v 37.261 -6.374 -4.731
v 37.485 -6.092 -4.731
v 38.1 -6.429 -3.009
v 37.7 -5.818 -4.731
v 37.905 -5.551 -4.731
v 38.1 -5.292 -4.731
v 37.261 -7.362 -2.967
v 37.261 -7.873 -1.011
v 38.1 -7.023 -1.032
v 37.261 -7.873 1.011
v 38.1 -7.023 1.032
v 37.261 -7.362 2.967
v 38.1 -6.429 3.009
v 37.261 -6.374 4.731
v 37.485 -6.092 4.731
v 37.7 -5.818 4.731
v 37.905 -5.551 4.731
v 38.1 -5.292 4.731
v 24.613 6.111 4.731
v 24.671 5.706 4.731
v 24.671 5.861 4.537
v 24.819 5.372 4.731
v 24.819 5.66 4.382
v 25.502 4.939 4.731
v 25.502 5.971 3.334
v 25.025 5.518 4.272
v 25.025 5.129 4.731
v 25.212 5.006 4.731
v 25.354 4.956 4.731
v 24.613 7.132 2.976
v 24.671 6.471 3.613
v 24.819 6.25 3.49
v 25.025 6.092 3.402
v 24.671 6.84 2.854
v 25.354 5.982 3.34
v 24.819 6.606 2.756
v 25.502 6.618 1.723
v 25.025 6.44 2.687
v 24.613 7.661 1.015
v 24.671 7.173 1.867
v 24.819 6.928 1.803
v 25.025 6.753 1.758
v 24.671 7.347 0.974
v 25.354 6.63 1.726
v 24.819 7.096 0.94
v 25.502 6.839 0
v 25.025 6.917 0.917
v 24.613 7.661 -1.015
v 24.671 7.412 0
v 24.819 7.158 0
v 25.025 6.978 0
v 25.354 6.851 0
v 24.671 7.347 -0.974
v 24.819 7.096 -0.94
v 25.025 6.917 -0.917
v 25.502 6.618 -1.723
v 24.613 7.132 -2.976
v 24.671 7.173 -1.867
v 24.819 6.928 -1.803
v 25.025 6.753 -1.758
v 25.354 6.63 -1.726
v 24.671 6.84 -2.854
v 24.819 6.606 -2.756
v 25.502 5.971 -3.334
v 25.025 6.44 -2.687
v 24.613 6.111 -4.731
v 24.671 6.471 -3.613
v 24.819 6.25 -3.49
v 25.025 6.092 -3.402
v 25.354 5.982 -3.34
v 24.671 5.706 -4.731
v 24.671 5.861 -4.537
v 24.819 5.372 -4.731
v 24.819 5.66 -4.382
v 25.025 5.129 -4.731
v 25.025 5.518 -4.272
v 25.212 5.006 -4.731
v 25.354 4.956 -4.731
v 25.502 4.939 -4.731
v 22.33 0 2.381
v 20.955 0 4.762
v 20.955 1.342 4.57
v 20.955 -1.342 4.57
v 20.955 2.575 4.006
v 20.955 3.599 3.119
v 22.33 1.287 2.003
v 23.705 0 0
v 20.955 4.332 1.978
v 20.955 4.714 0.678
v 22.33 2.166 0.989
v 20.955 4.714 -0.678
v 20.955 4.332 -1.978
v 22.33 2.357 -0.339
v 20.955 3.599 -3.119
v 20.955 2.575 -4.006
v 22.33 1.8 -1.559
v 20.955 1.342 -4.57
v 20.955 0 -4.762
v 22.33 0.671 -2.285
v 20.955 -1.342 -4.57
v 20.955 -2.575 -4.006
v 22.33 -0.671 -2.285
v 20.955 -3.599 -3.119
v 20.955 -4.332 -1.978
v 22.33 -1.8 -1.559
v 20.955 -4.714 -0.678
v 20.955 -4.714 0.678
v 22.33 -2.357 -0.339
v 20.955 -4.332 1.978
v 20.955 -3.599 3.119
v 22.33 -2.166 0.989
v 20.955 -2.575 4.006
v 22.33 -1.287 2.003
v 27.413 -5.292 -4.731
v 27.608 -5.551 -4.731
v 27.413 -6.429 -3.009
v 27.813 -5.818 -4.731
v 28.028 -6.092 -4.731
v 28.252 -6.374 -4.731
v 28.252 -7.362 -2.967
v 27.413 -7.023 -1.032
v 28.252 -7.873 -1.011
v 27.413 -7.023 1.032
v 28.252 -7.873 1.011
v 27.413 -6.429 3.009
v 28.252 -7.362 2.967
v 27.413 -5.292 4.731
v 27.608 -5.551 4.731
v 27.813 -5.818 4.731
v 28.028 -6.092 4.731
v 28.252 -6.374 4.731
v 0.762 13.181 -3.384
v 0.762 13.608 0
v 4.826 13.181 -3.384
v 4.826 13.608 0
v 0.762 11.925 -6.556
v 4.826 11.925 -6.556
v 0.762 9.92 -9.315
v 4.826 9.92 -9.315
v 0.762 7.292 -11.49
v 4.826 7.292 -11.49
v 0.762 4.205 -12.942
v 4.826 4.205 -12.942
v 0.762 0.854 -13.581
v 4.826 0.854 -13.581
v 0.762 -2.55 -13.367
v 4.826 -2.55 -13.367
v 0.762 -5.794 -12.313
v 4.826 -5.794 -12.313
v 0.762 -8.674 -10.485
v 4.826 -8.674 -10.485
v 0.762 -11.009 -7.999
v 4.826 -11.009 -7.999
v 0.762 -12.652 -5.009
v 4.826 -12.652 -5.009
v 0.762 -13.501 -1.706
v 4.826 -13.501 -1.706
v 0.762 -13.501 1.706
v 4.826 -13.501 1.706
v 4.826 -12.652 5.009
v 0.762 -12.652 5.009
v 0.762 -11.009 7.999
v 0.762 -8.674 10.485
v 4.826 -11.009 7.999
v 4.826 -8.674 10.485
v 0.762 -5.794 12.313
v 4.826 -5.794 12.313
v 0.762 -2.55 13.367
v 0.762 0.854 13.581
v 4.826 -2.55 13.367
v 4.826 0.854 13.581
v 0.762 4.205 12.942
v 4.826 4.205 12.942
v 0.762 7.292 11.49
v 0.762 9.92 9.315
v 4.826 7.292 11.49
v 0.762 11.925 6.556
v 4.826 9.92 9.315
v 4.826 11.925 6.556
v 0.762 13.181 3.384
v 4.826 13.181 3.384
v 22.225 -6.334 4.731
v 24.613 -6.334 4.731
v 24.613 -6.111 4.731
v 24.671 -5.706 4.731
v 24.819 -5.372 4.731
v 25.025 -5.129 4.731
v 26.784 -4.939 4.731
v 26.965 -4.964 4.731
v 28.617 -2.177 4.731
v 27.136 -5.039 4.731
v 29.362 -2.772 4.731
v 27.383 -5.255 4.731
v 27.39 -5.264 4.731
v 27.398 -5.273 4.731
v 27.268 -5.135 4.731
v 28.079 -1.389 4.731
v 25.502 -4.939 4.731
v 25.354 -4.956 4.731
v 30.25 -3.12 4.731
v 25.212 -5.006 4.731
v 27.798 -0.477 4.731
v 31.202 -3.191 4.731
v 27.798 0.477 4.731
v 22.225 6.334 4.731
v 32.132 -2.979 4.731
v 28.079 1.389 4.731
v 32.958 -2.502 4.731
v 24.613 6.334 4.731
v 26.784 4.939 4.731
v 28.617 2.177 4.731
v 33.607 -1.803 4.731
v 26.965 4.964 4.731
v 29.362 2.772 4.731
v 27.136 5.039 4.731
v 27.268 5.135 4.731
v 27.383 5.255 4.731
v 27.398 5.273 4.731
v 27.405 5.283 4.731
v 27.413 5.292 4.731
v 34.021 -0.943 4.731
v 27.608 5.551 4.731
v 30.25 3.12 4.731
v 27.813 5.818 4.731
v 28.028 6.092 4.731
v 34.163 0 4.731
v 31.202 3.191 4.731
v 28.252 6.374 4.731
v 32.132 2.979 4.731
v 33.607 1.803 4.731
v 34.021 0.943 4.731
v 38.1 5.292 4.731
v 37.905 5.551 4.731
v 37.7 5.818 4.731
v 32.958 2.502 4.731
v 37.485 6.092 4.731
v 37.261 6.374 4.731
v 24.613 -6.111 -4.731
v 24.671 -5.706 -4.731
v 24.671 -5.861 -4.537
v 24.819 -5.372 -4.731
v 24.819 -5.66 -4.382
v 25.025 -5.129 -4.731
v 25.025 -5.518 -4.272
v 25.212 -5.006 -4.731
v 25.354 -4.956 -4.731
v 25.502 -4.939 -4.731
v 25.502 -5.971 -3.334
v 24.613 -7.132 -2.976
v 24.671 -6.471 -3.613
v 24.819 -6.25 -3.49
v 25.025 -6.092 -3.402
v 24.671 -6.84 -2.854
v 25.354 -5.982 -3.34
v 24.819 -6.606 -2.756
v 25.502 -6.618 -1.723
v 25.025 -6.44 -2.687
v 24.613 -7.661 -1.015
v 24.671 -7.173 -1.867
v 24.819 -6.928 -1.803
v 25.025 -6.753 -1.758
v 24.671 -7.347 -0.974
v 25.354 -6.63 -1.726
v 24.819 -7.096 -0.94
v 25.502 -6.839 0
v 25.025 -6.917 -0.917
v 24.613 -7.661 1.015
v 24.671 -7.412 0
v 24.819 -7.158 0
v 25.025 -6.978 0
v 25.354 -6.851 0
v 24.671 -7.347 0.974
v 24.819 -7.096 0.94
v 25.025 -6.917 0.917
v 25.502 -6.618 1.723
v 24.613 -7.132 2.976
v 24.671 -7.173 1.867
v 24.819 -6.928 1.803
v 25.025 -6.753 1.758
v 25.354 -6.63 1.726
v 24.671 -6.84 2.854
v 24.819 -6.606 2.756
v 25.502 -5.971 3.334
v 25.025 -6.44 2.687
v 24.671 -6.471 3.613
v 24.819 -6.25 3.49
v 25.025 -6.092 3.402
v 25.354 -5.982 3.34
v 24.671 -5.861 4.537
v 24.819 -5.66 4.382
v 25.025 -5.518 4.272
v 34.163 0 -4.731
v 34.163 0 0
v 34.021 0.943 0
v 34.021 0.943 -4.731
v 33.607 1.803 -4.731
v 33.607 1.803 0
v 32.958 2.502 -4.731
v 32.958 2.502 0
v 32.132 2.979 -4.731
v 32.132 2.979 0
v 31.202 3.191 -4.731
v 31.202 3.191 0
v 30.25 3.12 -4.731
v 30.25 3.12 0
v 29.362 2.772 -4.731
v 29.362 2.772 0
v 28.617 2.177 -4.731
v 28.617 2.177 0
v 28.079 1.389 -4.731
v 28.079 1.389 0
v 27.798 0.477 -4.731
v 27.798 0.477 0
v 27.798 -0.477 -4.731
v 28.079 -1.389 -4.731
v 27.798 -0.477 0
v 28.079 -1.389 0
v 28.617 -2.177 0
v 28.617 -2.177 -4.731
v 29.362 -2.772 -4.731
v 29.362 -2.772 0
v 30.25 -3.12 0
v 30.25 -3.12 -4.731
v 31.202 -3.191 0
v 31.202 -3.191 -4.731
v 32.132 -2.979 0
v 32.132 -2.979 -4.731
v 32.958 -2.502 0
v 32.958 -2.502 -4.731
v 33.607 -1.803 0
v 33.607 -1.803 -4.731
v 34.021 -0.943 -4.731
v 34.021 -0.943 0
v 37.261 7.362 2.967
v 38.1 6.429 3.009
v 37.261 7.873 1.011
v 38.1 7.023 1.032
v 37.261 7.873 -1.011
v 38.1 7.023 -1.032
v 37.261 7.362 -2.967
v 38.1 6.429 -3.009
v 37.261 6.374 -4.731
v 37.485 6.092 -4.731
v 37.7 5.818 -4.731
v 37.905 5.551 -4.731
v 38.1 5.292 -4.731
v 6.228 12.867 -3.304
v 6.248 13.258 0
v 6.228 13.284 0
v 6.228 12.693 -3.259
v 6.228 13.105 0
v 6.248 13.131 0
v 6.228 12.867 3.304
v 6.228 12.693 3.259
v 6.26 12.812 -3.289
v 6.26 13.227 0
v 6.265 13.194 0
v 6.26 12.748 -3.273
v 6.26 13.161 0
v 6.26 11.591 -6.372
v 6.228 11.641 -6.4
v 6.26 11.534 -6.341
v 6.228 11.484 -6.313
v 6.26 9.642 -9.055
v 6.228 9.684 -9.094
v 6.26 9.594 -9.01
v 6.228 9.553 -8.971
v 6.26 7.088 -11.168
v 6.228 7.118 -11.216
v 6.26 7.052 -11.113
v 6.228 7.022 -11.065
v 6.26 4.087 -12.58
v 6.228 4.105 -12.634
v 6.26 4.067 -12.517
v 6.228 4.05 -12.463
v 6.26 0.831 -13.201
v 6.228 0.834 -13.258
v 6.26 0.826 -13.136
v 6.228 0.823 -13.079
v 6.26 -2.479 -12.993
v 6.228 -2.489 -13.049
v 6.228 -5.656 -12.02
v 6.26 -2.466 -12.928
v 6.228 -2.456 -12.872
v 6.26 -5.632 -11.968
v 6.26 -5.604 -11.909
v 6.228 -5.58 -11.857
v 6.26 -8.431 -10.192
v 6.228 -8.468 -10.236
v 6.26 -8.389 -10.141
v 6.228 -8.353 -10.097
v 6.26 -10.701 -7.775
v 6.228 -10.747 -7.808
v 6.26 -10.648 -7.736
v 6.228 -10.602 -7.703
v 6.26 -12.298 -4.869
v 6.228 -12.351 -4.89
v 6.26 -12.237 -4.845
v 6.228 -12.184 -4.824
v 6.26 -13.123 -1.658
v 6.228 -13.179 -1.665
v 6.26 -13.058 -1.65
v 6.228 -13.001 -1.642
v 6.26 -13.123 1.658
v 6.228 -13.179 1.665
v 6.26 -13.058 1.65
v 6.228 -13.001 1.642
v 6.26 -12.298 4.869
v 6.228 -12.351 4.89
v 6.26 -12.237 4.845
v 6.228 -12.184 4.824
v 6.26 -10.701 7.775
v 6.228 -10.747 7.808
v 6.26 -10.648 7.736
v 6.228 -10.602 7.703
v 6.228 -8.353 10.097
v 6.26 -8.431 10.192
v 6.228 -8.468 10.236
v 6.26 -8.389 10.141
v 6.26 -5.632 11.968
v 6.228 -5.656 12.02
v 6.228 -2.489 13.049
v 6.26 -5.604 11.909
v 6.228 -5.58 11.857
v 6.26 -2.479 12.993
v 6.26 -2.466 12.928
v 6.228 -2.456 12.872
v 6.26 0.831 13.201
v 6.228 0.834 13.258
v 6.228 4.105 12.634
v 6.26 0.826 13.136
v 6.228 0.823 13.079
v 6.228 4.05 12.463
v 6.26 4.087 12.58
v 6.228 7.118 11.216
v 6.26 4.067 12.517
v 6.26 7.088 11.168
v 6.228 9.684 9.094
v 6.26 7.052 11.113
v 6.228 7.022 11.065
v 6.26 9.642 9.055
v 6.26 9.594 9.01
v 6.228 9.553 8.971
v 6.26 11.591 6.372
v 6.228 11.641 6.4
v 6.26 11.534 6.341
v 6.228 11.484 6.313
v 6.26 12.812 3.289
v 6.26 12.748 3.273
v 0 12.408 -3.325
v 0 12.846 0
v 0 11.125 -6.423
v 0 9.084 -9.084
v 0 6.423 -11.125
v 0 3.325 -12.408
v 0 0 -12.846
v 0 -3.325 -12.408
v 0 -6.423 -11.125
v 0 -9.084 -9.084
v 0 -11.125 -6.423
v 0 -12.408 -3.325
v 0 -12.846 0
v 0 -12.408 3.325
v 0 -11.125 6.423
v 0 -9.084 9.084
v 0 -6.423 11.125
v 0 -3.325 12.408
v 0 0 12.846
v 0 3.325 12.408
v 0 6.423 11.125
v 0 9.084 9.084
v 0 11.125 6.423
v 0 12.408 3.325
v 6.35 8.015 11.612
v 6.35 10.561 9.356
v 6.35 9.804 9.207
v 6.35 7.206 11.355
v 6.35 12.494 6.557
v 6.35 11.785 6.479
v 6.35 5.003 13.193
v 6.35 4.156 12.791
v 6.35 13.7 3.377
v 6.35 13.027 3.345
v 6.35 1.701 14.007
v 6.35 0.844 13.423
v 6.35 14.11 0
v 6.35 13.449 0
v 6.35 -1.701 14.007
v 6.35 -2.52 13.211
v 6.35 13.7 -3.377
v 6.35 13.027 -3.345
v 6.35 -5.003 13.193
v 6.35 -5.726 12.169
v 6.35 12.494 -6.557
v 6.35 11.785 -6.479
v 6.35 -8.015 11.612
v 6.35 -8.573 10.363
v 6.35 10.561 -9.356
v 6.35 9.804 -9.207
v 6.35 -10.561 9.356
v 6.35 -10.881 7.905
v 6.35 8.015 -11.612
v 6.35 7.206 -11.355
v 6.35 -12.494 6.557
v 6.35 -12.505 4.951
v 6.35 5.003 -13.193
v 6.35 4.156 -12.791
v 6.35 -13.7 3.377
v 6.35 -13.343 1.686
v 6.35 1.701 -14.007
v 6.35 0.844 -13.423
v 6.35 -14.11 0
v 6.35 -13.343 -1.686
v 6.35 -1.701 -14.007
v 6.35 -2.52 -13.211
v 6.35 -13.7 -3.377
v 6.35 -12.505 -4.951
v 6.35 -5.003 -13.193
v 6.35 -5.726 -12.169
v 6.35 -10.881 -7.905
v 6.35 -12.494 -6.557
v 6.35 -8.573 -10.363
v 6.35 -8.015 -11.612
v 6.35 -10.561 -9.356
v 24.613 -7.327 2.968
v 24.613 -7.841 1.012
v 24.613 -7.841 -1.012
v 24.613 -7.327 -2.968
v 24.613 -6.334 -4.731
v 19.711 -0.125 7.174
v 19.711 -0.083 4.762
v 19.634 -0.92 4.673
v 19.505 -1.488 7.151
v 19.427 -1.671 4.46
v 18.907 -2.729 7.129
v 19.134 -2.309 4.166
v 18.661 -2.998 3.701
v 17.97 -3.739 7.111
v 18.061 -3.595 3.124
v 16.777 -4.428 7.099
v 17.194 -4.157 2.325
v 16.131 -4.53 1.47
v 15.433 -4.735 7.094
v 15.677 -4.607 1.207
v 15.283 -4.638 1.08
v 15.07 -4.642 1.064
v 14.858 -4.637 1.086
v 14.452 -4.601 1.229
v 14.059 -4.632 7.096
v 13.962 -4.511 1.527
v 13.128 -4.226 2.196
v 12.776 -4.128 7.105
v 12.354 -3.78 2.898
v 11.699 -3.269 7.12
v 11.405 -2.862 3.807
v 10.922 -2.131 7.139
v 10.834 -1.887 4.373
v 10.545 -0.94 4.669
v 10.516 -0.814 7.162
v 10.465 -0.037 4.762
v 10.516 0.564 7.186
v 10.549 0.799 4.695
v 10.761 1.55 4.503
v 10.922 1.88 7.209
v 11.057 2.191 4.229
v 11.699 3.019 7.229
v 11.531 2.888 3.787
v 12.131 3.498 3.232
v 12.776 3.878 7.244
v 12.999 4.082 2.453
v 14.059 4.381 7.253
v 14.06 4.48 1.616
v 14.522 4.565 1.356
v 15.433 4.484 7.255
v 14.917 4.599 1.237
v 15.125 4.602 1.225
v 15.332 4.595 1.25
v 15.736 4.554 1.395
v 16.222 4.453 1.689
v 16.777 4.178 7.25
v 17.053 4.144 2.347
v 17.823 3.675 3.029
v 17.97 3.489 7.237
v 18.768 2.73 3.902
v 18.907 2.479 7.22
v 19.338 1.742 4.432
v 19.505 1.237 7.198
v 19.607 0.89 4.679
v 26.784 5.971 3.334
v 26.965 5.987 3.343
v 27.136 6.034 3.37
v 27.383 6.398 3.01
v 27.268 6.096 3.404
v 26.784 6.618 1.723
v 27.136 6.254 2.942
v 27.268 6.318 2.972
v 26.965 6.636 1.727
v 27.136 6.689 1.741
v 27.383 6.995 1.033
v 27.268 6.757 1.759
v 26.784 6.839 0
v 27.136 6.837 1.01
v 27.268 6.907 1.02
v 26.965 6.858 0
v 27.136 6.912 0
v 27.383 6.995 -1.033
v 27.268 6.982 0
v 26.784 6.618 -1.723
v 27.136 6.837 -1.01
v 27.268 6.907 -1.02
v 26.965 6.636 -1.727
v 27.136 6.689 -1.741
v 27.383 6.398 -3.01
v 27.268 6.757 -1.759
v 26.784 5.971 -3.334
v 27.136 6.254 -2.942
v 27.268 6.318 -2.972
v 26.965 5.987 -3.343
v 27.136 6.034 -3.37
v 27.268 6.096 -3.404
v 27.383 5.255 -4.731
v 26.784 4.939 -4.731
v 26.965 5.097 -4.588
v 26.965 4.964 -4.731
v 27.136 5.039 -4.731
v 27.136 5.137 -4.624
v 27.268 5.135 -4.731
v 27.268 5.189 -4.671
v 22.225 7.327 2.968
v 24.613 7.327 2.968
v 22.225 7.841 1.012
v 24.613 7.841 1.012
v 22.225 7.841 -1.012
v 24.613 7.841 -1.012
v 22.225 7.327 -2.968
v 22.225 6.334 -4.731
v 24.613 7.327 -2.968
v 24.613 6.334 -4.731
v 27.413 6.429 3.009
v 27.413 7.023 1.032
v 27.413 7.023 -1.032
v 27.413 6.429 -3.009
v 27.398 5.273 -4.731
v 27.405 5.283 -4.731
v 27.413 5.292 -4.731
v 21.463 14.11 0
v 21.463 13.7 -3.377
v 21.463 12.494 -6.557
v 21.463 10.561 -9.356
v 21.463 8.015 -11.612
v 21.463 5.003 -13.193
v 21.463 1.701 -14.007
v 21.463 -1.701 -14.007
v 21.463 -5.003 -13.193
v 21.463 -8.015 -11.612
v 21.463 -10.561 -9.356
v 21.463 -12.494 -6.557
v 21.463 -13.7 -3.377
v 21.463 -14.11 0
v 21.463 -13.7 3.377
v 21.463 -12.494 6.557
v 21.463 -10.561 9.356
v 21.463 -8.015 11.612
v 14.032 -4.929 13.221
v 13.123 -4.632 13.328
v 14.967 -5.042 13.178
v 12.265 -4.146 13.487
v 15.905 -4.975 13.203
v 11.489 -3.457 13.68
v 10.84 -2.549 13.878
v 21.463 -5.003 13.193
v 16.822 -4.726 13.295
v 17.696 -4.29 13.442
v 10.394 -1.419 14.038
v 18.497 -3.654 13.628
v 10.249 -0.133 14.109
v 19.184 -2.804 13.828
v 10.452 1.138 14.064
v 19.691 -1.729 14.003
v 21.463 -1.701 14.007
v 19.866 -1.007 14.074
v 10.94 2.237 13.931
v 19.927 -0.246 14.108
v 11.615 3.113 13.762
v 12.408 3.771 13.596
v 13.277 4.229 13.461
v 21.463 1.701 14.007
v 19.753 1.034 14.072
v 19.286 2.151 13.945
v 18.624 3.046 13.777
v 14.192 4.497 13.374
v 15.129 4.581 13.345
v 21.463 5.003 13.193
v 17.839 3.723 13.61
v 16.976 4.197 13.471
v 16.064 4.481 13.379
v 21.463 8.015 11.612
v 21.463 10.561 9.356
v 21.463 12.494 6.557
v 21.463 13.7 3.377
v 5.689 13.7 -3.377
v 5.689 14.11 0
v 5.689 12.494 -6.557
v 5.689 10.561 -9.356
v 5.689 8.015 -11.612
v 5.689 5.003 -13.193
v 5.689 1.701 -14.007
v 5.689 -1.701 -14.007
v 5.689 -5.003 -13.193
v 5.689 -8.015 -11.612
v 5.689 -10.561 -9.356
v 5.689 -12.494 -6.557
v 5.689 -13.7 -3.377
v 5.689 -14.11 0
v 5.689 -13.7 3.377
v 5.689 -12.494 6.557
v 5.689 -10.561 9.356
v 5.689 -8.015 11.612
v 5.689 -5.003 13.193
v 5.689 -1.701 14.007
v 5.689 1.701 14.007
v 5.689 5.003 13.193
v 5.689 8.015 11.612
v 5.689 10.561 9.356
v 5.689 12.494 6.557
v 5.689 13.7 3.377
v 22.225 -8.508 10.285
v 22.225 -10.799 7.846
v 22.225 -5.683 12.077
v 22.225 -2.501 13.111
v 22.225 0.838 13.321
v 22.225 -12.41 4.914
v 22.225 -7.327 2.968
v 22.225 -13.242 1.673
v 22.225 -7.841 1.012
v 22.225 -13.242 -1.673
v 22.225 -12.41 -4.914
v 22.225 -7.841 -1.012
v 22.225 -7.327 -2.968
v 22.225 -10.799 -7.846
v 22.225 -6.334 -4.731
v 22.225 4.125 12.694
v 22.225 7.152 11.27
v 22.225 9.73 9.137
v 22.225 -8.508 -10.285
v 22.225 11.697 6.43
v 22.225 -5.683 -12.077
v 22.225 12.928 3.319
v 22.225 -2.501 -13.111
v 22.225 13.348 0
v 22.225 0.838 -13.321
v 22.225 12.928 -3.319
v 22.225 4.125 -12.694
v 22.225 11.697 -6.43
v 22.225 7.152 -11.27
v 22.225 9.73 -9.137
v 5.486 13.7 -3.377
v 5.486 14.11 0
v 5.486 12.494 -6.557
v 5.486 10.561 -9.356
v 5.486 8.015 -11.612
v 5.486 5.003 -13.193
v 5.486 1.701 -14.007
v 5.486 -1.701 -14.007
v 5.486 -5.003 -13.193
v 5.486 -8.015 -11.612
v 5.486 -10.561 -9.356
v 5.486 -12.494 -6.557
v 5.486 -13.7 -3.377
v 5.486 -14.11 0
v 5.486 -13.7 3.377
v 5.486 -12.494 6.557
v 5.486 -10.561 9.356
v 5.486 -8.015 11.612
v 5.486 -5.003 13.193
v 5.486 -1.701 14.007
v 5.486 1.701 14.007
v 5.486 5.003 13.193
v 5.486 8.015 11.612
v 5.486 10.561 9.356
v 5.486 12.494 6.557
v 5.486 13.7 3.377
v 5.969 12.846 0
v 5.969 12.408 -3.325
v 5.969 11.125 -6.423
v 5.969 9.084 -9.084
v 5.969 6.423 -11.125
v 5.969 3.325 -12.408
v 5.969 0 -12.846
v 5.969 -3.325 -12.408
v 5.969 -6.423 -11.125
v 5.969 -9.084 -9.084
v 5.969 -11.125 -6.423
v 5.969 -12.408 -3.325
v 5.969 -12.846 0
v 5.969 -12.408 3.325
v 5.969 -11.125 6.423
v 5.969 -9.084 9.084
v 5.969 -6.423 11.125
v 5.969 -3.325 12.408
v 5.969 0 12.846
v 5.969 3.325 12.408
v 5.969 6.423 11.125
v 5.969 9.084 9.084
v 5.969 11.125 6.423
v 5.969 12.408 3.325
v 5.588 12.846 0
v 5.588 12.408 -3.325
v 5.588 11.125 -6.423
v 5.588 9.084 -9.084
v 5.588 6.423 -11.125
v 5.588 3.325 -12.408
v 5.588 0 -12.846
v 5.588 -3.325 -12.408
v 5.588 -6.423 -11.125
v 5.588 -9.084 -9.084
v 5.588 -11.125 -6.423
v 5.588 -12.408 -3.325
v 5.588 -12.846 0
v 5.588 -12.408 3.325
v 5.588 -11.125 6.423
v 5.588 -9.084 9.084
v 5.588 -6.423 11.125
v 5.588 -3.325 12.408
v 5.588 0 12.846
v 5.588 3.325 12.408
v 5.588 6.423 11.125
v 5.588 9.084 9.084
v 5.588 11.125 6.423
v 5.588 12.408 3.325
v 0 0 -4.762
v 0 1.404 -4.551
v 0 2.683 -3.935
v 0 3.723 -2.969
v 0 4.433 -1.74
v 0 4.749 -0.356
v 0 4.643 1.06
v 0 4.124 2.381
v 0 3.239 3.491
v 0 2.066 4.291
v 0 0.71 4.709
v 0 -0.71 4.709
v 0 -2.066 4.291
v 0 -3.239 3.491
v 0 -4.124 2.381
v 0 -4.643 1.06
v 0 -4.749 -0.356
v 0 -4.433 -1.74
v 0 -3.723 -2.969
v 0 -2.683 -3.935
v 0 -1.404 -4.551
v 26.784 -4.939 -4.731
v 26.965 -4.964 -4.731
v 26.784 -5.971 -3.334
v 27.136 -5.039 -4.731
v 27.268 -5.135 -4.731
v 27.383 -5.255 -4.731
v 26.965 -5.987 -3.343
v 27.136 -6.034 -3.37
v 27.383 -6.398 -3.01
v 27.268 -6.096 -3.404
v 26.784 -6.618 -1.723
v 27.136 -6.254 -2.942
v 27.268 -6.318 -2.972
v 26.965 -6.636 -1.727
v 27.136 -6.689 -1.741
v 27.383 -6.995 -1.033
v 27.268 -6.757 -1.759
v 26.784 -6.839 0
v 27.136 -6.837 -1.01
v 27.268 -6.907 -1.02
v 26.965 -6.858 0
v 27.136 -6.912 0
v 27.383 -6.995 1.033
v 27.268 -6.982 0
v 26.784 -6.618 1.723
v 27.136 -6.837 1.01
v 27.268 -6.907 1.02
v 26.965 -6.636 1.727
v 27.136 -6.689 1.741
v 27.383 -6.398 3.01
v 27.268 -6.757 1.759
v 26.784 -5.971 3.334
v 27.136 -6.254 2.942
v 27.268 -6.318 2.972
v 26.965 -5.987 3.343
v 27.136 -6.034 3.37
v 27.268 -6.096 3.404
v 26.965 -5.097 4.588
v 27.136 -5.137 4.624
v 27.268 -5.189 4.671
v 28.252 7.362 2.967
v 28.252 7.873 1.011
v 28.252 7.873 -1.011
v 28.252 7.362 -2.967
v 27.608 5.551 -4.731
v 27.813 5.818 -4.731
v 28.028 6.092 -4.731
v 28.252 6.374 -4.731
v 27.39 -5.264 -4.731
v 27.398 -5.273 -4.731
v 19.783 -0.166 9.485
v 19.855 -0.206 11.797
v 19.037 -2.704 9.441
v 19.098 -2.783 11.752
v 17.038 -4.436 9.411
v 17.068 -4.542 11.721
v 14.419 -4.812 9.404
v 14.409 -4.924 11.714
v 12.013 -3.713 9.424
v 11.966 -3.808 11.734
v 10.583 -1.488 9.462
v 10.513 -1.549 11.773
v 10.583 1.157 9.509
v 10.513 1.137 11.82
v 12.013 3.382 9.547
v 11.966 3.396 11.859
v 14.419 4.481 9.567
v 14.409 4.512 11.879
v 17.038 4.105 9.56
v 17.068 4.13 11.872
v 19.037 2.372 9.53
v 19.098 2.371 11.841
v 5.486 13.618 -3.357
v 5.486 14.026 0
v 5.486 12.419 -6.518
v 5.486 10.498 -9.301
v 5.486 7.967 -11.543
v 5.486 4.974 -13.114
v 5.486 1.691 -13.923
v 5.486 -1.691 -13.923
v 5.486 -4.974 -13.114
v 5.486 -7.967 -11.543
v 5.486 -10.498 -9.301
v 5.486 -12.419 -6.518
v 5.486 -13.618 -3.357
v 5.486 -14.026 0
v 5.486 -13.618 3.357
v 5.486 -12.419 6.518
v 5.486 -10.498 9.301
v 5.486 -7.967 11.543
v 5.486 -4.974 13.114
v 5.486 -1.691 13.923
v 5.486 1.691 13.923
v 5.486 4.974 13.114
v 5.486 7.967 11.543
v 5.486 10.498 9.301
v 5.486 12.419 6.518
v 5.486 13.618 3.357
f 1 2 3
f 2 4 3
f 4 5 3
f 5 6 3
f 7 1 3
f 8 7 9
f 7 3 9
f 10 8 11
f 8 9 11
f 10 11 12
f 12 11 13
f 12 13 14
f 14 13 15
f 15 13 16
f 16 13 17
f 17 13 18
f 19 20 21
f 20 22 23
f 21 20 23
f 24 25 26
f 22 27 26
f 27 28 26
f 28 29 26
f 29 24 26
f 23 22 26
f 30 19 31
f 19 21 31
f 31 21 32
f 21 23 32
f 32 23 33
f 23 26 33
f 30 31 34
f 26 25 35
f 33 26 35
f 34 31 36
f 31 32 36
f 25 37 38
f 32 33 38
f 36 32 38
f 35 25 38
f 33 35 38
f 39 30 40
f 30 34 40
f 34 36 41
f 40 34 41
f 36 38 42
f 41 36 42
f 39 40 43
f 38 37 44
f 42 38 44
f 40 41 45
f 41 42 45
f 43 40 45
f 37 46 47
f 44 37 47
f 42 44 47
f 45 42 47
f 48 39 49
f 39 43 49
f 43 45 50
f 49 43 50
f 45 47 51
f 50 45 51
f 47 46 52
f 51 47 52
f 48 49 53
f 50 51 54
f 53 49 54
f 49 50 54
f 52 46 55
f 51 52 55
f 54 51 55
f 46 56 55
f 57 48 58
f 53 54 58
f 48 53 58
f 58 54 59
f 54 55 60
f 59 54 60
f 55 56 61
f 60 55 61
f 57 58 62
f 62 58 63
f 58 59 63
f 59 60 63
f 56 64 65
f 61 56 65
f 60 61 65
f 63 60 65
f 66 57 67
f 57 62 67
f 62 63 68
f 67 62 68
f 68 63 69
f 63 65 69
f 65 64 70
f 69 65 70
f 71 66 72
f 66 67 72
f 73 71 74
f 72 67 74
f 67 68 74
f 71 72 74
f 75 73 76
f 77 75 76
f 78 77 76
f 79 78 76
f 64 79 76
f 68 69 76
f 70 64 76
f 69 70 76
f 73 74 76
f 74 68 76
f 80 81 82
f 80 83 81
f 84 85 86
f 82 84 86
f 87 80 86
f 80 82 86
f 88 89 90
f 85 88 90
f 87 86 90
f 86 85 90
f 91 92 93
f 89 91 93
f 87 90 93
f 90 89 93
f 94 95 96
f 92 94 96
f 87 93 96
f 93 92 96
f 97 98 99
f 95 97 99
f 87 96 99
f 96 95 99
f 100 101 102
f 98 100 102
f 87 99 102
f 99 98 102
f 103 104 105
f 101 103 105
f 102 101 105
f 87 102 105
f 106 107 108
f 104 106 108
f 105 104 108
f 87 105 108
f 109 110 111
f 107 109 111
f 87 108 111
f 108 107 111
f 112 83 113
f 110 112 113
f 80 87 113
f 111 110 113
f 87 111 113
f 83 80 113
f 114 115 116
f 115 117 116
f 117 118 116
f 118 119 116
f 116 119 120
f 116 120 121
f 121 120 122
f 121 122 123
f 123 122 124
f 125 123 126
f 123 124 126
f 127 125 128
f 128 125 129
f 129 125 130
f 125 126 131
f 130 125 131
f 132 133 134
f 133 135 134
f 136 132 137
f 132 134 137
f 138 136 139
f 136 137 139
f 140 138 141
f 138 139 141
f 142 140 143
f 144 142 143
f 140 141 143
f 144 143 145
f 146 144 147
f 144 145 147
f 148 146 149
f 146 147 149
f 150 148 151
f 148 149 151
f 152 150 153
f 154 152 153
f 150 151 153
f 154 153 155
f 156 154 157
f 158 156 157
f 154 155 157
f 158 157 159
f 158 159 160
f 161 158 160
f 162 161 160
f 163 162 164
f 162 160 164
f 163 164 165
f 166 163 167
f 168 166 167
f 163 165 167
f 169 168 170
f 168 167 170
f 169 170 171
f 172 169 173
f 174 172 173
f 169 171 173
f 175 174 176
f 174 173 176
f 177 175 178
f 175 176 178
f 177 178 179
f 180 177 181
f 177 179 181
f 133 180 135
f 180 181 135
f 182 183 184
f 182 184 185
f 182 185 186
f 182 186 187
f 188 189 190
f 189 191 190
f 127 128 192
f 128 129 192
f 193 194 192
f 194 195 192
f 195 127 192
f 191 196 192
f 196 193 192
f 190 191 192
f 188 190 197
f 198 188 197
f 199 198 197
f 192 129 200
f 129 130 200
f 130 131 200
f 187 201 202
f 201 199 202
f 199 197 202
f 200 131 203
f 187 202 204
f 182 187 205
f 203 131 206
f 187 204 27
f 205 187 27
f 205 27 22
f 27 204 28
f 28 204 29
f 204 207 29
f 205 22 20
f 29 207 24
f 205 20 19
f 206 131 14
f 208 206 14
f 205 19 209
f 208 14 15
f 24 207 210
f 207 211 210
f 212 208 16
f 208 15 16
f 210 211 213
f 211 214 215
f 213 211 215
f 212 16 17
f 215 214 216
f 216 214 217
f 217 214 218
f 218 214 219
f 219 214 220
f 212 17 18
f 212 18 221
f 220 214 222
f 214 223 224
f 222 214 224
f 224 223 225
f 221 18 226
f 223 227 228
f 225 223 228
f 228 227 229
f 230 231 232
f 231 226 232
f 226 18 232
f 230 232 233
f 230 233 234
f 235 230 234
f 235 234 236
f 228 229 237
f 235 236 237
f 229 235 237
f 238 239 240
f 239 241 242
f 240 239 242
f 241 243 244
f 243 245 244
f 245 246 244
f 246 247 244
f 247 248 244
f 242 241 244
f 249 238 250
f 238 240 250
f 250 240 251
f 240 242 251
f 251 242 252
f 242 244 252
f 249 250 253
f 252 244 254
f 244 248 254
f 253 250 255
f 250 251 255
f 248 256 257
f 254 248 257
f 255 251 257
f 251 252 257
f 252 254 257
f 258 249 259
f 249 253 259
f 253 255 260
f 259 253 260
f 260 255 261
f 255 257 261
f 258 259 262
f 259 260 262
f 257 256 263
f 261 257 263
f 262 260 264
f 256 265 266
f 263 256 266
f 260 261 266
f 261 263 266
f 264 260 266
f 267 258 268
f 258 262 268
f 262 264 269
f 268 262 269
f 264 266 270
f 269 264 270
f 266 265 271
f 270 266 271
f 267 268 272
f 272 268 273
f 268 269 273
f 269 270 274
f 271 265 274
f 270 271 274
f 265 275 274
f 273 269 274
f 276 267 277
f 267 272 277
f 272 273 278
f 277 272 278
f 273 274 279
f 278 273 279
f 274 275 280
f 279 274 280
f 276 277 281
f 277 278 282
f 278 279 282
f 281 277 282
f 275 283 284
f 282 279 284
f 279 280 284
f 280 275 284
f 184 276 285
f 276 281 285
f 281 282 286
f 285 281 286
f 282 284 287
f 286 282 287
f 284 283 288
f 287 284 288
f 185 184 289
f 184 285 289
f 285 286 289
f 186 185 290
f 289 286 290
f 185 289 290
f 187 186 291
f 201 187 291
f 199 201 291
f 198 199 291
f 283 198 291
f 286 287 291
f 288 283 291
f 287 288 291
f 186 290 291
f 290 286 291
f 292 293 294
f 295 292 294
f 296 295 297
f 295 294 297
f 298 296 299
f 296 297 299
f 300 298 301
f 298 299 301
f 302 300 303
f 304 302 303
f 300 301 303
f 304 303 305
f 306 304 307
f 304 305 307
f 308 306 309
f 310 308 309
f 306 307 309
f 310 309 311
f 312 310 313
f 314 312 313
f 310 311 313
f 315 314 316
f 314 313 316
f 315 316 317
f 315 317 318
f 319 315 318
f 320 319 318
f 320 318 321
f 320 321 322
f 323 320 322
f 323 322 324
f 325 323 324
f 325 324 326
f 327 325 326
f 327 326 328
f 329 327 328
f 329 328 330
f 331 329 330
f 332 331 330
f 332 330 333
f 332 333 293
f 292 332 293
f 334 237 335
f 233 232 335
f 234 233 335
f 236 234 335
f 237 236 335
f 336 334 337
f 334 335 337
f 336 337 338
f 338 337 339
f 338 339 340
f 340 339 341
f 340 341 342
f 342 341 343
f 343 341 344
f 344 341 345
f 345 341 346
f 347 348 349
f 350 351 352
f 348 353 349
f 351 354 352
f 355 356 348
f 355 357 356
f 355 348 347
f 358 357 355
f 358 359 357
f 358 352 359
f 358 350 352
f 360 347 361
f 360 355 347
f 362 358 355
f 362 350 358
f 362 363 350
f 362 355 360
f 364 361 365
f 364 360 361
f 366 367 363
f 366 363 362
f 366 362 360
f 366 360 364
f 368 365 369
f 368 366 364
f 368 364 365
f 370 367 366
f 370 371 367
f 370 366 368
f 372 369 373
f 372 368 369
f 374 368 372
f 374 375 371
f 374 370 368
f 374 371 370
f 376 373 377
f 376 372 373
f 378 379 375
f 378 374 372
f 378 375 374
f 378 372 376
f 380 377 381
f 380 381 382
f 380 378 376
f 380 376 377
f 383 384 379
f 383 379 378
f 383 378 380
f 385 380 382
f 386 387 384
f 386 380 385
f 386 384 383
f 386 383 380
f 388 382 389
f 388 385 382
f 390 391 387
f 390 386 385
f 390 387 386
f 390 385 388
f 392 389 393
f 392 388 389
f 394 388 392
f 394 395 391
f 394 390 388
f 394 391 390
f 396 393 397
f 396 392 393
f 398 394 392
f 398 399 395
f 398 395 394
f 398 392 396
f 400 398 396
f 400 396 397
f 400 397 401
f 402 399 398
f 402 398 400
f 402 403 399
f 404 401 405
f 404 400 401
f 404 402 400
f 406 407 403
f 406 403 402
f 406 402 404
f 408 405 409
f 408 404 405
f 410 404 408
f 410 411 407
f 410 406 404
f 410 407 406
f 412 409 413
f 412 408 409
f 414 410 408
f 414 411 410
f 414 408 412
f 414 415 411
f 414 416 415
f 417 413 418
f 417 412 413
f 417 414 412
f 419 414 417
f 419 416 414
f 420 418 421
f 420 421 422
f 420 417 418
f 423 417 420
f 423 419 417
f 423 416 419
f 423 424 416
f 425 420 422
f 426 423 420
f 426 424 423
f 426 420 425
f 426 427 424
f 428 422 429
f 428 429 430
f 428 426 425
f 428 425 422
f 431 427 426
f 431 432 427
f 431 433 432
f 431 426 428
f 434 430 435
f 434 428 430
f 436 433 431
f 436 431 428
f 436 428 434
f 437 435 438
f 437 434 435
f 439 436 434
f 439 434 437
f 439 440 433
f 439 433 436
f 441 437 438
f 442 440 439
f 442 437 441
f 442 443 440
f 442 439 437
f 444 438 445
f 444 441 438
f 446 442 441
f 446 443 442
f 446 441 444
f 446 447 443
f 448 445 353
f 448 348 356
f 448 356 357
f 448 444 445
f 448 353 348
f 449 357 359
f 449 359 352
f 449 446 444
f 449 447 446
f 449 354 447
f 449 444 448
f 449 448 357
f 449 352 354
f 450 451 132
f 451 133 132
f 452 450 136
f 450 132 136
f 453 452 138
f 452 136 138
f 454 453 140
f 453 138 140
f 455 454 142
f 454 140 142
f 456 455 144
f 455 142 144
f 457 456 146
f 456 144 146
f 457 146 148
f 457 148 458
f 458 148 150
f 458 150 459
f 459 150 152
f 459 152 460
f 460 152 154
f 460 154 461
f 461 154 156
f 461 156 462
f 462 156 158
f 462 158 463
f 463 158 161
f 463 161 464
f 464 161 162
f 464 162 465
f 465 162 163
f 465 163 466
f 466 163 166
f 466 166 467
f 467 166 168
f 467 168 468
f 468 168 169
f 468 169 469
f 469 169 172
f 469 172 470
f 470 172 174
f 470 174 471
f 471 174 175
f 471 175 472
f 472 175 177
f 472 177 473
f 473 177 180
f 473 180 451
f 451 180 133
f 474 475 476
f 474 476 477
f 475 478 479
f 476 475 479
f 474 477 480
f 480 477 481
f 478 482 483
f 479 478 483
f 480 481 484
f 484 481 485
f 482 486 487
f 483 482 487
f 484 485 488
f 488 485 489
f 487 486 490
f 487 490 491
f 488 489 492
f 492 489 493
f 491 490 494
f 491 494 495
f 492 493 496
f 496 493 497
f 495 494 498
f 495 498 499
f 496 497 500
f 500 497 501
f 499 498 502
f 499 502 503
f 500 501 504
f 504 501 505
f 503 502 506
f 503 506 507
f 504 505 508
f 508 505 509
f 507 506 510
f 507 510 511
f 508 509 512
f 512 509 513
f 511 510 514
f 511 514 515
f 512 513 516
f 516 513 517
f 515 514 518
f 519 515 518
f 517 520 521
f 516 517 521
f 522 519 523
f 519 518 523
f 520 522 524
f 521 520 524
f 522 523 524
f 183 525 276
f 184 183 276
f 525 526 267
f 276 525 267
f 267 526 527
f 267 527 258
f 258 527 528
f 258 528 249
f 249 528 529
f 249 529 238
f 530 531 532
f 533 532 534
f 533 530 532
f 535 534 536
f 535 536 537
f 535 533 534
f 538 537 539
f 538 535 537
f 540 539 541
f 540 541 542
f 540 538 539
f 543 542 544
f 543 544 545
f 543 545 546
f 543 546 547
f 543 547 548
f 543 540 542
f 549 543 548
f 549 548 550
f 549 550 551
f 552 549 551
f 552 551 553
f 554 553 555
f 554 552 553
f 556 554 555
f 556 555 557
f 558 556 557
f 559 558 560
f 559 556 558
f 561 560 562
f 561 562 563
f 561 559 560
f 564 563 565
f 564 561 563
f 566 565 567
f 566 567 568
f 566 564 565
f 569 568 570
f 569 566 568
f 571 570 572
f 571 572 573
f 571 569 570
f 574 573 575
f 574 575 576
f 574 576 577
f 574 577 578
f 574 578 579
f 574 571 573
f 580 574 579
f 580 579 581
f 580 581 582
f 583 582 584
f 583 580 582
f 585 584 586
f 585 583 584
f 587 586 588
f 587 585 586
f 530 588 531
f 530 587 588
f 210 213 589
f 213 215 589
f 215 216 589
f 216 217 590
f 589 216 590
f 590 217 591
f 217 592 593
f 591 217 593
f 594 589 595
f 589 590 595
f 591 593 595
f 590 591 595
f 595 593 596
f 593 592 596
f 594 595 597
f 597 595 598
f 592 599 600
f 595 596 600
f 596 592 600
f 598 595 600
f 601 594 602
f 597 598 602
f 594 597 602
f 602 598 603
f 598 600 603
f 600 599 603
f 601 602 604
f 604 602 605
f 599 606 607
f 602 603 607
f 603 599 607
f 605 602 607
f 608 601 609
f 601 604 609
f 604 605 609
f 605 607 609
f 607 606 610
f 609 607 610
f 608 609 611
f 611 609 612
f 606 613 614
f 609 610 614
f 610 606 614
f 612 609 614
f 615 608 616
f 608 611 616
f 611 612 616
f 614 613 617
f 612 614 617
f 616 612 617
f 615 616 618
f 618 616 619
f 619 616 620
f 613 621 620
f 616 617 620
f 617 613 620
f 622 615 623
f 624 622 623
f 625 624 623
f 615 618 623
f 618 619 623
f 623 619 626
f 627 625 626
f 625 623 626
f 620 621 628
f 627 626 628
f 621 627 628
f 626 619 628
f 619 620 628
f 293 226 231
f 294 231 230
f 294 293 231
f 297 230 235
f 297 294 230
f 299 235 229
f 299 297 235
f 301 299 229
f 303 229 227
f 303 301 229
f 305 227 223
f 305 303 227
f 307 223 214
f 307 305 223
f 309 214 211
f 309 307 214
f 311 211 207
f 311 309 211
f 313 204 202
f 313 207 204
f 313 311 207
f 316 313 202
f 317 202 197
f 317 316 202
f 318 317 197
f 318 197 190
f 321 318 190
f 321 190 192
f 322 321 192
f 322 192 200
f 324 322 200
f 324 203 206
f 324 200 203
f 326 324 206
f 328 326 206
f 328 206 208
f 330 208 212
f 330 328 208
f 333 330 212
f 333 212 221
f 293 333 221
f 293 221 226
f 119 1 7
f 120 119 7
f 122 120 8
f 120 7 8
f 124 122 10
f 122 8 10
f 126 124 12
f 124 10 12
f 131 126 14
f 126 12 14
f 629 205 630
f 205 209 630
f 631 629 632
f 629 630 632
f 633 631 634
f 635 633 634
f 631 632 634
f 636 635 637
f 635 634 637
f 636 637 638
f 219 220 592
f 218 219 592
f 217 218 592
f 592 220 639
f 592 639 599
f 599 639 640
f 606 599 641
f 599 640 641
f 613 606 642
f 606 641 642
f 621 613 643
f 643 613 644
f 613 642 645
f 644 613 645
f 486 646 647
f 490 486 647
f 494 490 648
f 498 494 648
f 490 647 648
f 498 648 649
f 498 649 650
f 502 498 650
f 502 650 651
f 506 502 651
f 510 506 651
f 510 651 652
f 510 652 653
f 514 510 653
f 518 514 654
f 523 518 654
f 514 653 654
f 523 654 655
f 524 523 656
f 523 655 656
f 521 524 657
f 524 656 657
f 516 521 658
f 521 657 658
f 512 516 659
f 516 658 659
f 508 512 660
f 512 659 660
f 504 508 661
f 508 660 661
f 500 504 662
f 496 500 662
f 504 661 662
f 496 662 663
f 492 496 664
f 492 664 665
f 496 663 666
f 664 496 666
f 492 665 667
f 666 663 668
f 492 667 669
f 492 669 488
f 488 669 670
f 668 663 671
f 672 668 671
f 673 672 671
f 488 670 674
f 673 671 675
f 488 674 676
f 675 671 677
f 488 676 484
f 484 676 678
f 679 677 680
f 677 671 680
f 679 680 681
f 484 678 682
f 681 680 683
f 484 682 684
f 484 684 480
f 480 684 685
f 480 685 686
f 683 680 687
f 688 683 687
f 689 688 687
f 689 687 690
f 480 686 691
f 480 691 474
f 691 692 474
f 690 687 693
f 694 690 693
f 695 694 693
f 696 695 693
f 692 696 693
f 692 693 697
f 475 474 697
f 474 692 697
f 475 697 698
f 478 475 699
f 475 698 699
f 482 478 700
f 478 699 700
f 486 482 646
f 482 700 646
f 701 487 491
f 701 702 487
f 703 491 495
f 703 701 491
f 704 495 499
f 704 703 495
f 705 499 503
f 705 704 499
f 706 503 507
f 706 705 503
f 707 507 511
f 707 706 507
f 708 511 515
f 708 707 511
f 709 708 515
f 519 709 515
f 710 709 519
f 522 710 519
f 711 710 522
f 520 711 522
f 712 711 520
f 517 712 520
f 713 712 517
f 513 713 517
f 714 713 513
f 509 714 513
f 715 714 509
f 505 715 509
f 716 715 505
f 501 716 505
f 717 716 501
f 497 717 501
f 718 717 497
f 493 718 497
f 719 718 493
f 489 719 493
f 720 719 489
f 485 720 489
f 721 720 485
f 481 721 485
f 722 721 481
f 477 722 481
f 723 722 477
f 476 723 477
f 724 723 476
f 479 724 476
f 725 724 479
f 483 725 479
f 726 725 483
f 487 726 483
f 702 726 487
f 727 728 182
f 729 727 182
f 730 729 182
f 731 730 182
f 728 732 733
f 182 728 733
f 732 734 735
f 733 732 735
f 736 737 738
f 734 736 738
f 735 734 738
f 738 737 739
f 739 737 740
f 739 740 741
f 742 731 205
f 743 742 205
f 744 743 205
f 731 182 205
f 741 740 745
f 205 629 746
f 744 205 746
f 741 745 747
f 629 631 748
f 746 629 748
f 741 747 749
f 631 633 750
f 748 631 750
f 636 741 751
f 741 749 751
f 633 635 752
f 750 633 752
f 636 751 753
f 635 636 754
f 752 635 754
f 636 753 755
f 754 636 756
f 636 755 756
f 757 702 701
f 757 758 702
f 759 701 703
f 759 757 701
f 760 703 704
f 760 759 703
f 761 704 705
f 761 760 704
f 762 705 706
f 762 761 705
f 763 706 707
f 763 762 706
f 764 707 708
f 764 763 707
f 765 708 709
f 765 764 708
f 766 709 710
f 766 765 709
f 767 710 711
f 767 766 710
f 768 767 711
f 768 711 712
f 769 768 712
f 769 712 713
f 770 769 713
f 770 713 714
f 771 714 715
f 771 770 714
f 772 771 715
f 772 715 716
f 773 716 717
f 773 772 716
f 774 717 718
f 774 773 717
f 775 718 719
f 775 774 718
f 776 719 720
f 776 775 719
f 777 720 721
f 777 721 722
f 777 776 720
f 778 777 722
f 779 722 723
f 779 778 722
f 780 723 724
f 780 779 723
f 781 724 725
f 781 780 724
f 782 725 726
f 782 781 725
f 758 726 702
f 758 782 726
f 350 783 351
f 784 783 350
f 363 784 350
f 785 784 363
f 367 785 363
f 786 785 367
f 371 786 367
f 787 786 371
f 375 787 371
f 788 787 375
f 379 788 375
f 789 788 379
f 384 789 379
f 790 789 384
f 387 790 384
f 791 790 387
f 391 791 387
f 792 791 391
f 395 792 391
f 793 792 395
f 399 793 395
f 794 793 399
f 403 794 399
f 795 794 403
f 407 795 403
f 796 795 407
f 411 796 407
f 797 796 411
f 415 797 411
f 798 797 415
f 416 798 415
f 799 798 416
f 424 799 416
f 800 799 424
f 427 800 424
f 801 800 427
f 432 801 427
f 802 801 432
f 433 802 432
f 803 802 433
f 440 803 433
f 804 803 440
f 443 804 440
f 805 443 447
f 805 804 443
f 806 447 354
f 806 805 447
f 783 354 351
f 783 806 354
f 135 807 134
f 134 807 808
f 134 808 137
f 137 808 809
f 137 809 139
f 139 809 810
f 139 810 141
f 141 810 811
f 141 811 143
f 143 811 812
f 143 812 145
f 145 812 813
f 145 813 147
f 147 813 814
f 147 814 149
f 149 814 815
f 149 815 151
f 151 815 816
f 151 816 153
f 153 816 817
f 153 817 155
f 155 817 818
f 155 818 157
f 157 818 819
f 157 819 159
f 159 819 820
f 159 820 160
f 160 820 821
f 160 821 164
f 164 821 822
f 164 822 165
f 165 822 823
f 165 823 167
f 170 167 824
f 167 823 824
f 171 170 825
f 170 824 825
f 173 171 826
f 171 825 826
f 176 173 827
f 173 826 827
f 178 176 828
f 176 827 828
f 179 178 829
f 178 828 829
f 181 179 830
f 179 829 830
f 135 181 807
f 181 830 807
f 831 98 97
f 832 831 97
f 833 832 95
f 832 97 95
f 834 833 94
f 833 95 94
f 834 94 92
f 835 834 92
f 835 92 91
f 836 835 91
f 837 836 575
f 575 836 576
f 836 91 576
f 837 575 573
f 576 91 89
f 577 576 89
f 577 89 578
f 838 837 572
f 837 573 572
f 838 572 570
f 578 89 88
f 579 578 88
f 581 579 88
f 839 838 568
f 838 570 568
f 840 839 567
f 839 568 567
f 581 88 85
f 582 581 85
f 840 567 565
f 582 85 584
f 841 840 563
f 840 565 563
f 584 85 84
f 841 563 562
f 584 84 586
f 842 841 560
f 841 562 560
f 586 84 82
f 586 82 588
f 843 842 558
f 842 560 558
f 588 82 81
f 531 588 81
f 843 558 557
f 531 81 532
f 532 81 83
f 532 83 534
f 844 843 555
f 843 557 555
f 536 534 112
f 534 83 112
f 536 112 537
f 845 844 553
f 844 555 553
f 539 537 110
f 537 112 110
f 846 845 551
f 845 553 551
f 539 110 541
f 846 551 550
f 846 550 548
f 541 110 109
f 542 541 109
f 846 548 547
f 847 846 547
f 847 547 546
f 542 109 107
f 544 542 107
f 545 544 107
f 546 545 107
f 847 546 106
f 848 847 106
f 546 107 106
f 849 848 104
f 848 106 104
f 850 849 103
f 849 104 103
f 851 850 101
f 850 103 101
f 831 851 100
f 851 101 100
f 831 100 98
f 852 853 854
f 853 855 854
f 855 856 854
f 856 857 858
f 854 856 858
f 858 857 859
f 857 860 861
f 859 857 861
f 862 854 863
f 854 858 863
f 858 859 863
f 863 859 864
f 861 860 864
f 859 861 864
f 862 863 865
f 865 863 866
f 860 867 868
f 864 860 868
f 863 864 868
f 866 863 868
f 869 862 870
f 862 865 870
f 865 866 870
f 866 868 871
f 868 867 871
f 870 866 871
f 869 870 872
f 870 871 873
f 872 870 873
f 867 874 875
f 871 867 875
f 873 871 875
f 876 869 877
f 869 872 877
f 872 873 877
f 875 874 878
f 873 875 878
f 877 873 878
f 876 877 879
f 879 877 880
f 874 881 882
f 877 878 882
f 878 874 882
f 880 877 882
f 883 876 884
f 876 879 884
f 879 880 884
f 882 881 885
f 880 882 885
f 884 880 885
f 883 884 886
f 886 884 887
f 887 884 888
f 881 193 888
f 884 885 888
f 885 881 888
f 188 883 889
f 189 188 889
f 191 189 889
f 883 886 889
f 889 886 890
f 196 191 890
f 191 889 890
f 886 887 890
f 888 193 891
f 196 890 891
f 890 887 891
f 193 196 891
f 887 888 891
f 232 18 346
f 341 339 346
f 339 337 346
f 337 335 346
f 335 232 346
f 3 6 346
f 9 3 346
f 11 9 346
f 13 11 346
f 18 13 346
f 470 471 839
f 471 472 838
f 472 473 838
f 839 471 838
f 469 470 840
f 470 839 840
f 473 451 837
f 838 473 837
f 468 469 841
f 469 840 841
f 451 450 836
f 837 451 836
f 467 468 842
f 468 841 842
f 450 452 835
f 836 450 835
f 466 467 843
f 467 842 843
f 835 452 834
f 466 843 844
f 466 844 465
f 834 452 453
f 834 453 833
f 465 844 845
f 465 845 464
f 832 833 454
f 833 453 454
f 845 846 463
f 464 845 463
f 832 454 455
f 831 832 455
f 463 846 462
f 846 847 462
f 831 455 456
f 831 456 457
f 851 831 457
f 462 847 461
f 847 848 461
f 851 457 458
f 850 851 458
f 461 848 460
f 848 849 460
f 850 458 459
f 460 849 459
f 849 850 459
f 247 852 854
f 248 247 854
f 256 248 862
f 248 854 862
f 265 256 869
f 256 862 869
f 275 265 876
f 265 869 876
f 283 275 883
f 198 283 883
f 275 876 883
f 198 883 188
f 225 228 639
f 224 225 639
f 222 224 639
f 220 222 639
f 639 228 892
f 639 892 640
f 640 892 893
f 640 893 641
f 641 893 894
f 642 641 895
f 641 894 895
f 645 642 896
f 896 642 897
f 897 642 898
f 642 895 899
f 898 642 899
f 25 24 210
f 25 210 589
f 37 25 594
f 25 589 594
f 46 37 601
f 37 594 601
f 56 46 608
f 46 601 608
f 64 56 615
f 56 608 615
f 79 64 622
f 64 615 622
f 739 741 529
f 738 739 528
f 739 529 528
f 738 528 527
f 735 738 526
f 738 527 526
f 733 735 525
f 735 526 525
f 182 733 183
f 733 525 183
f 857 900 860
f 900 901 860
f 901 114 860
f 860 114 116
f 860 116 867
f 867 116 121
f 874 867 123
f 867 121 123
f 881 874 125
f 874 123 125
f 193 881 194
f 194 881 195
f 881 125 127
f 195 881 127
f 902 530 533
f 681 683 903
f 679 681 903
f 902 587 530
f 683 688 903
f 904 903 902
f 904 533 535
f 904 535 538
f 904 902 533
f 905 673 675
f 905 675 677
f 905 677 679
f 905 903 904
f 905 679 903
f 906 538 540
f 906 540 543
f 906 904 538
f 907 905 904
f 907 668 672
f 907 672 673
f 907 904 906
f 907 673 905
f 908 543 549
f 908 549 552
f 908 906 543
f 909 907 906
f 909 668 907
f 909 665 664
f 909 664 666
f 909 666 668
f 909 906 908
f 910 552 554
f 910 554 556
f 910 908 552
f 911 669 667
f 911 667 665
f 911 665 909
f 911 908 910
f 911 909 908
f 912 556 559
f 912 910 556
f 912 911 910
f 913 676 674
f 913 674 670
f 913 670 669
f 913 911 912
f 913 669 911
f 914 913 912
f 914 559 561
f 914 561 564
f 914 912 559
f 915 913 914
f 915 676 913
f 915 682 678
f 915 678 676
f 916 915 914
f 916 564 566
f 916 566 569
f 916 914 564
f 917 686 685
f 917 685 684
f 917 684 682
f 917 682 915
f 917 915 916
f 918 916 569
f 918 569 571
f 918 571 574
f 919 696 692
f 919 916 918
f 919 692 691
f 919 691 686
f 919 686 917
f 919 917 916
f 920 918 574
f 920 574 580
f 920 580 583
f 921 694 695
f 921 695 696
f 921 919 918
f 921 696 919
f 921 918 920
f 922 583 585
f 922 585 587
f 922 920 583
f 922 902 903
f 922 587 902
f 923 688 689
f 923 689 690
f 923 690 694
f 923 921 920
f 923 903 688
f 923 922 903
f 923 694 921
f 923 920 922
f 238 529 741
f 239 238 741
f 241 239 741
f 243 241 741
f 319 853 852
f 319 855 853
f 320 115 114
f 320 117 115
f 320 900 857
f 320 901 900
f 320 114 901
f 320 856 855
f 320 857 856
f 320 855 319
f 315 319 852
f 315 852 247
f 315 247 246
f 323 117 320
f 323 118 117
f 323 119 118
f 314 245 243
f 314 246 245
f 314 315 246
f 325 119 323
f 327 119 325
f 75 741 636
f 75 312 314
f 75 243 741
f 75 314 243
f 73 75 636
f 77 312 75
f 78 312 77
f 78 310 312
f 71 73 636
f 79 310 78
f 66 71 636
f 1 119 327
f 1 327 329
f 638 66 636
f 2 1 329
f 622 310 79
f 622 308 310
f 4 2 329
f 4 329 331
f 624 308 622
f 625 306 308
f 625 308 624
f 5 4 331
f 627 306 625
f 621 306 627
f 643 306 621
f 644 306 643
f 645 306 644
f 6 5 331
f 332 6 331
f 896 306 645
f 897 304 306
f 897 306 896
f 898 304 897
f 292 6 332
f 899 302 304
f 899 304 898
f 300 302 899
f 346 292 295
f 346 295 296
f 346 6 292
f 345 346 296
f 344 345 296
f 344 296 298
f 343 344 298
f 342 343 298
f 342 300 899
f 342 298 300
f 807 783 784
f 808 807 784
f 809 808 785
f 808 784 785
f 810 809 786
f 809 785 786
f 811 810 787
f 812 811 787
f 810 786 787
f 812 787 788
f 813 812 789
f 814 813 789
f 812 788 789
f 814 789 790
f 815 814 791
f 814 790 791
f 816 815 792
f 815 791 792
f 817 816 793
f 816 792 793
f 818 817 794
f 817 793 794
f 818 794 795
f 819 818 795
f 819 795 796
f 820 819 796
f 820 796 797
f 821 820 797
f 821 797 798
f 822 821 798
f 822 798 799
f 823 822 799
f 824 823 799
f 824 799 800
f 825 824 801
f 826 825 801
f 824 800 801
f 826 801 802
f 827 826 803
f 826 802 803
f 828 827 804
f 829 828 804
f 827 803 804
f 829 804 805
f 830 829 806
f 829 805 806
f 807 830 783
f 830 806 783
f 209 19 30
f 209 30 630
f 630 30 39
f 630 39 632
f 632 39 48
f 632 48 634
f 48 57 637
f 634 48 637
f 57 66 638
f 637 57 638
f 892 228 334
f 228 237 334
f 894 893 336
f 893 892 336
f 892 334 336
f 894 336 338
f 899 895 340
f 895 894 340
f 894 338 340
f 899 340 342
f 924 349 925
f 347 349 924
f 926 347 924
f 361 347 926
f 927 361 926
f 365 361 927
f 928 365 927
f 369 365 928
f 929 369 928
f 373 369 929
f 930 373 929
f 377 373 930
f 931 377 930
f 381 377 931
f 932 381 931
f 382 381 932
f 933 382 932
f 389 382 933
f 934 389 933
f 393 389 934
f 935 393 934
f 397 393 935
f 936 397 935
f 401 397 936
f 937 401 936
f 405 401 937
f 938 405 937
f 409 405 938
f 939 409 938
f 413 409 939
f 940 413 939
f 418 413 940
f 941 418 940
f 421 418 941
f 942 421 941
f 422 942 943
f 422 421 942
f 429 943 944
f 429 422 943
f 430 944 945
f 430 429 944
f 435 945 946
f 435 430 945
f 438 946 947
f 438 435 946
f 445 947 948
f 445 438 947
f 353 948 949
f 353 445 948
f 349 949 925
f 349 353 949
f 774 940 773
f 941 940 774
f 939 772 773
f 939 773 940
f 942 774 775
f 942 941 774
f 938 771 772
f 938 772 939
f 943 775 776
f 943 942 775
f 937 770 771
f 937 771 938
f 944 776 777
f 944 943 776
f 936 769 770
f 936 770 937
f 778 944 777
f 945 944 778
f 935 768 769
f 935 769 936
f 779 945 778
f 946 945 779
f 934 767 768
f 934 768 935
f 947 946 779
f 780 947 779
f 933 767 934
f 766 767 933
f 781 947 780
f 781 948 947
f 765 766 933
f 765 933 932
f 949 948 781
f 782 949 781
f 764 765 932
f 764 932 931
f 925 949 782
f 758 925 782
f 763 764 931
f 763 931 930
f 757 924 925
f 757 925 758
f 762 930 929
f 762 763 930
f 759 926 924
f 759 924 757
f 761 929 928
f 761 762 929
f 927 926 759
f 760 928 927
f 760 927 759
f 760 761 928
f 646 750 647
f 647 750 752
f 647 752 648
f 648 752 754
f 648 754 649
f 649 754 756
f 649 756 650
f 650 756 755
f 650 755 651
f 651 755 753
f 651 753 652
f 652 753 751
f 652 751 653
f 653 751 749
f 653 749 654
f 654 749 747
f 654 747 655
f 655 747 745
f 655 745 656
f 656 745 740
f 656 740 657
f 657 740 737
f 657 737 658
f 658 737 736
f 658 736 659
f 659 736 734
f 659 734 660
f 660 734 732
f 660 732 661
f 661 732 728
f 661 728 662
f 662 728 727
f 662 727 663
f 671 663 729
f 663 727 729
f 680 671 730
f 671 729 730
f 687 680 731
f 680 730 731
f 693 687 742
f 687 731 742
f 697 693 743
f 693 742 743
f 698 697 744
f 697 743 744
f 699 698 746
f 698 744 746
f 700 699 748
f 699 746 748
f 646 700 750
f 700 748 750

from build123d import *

# Parameters (mm, degrees)
SKETCH3_W               = 56.4388
SKETCH3_H               = 112.8776
SKETCH3_W_2             = 9.4615
SKETCH3_H_2             = 56.4388
CUT_EXTRUDE1_DEPTH      = 15.875
HOLE1_D                 = 9.525
HOLE1_DEPTH             = 20.955
HOLE1_TIP               = 2.749630657
CUT_EXTRUDE2_DEPTH      = 7.096125
CUT_EXTRUDE2_DEPTH_BACK = 7.096125
SKETCH8_R               = 3.2004


with BuildPart() as part:
    # Sketch1 → Revolve1 (revolve)
    with BuildSketch(Plane.XY):
        Polygon((0, 0), (0, 12.84605), (0.762, 13.60805), (4.826, 13.60805), (5.588, 12.84605), (6.35, 12.84605), (6.35, 14.1097), (21.463, 14.1097), (22.225, 13.3477), (22.225, 0), align=None)
    revolve(axis=Axis((22.225, 0, 0), (-1, 0, 0)))

    # Sketch2 → Revolve2 (revolve)
    with BuildSketch(Plane.XY):
        with BuildLine():
            Line((22.225, 0), (22.225, 7.90575))
            Line((22.225, 7.90575), (24.6126, 7.90575))
            Line((24.6126, 7.90575), (24.6126, 7.72795))
            ThreePointArc((24.6126, 7.72795), (24.872982072, 7.099332072), (25.5016, 6.83895))
            Line((25.5016, 6.83895), (26.7843, 6.83895))
            ThreePointArc((26.7843, 6.83895), (27.10530348, 6.898927826), (27.38299292, 7.0707683))
            Line((27.38299292, 7.0707683), (27.412917928, 7.09803))
            Line((27.412917928, 7.09803), (28.252387928, 7.9375))
            Line((28.252387928, 7.9375), (37.26053, 7.9375))
            Line((37.26053, 7.9375), (38.1, 7.09803))
            Line((38.1, 7.09803), (38.1, 0))
            Line((38.1, 0), (22.225, 0))
        make_face()
    revolve(axis=Axis((38.1, 0, 0), (-1, 0, 0)))

    # Sketch3 → Cut-Extrude1 (cut)
    with BuildSketch(Plane(origin=(38.1, 0, 0), x_dir=(0, 0, -1), z_dir=(1, 0, 0))):
        Rectangle(SKETCH3_W, SKETCH3_H)
        Rectangle(SKETCH3_W_2, SKETCH3_H_2, mode=Mode.SUBTRACT)
    extrude(amount=-CUT_EXTRUDE1_DEPTH, mode=Mode.SUBTRACT)

    # Hole1
    with Locations(Plane.ZY):
        with Locations((0, 0)):
            Hole(HOLE1_D / 2, depth=HOLE1_DEPTH)
            with Locations((0, 0, -(HOLE1_DEPTH + HOLE1_TIP / 2))):  # 120° drill point
                Cone(0, HOLE1_D / 2, HOLE1_TIP, mode=Mode.SUBTRACT)

    # Sketch6 → Cut-Revolve1 (revolve, cut)
    with BuildSketch(Plane(origin=(0, 0, 0), x_dir=(1, 0, 0), z_dir=(0, 0.9998476951563913, 0.01745240643728403))):
        Polygon((15.0876, 0), (19.710593378, 0), (19.710593378, -7.1755), (19.927075925, -14.1097), (15.0876, -14.1097), align=None)
    revolve(axis=Axis((15.0876, -0.246248219, 14.107551024), (0, 0.01745240643728403, -0.9998476951563913)), mode=Mode.SUBTRACT)

    # Sketch7 → Revolve3 (revolve)
    with BuildSketch(Plane.XY):
        with BuildLine():
            Line((5.48614893, 14.025531804), (6.227512806, 13.284167928))
            ThreePointArc((6.227512806, 13.284167928), (6.264710245, 13.194365367), (6.227512806, 13.104562806))
            Line((6.227512806, 13.104562806), (5.969, 12.84605))
            Line((5.969, 12.84605), (5.588, 12.84605))
            Line((5.588, 12.84605), (5.588, 12.59205))
            Line((5.588, 12.59205), (6.35, 12.59205))
            Line((6.35, 12.59205), (6.35, 13.44904893))
            Line((6.35, 13.44904893), (5.68934893, 14.1097))
            Line((5.68934893, 14.1097), (5.48614893, 14.1097))
            Line((5.48614893, 14.1097), (5.48614893, 14.025531804))
        make_face()
    revolve(axis=Axis((6.35, 0, 0), (-1, 0, 0)))

    # Sketch8 → Cut-Extrude2 (cut, two sides: drawn at the far end of the back side and taken through both)
    with BuildSketch(Plane.XY.offset(-CUT_EXTRUDE2_DEPTH_BACK)):
        with Locations((30.9626, 0)):
            Circle(SKETCH8_R)
    extrude(amount=CUT_EXTRUDE2_DEPTH + CUT_EXTRUDE2_DEPTH_BACK, mode=Mode.SUBTRACT)


solid = part.part
